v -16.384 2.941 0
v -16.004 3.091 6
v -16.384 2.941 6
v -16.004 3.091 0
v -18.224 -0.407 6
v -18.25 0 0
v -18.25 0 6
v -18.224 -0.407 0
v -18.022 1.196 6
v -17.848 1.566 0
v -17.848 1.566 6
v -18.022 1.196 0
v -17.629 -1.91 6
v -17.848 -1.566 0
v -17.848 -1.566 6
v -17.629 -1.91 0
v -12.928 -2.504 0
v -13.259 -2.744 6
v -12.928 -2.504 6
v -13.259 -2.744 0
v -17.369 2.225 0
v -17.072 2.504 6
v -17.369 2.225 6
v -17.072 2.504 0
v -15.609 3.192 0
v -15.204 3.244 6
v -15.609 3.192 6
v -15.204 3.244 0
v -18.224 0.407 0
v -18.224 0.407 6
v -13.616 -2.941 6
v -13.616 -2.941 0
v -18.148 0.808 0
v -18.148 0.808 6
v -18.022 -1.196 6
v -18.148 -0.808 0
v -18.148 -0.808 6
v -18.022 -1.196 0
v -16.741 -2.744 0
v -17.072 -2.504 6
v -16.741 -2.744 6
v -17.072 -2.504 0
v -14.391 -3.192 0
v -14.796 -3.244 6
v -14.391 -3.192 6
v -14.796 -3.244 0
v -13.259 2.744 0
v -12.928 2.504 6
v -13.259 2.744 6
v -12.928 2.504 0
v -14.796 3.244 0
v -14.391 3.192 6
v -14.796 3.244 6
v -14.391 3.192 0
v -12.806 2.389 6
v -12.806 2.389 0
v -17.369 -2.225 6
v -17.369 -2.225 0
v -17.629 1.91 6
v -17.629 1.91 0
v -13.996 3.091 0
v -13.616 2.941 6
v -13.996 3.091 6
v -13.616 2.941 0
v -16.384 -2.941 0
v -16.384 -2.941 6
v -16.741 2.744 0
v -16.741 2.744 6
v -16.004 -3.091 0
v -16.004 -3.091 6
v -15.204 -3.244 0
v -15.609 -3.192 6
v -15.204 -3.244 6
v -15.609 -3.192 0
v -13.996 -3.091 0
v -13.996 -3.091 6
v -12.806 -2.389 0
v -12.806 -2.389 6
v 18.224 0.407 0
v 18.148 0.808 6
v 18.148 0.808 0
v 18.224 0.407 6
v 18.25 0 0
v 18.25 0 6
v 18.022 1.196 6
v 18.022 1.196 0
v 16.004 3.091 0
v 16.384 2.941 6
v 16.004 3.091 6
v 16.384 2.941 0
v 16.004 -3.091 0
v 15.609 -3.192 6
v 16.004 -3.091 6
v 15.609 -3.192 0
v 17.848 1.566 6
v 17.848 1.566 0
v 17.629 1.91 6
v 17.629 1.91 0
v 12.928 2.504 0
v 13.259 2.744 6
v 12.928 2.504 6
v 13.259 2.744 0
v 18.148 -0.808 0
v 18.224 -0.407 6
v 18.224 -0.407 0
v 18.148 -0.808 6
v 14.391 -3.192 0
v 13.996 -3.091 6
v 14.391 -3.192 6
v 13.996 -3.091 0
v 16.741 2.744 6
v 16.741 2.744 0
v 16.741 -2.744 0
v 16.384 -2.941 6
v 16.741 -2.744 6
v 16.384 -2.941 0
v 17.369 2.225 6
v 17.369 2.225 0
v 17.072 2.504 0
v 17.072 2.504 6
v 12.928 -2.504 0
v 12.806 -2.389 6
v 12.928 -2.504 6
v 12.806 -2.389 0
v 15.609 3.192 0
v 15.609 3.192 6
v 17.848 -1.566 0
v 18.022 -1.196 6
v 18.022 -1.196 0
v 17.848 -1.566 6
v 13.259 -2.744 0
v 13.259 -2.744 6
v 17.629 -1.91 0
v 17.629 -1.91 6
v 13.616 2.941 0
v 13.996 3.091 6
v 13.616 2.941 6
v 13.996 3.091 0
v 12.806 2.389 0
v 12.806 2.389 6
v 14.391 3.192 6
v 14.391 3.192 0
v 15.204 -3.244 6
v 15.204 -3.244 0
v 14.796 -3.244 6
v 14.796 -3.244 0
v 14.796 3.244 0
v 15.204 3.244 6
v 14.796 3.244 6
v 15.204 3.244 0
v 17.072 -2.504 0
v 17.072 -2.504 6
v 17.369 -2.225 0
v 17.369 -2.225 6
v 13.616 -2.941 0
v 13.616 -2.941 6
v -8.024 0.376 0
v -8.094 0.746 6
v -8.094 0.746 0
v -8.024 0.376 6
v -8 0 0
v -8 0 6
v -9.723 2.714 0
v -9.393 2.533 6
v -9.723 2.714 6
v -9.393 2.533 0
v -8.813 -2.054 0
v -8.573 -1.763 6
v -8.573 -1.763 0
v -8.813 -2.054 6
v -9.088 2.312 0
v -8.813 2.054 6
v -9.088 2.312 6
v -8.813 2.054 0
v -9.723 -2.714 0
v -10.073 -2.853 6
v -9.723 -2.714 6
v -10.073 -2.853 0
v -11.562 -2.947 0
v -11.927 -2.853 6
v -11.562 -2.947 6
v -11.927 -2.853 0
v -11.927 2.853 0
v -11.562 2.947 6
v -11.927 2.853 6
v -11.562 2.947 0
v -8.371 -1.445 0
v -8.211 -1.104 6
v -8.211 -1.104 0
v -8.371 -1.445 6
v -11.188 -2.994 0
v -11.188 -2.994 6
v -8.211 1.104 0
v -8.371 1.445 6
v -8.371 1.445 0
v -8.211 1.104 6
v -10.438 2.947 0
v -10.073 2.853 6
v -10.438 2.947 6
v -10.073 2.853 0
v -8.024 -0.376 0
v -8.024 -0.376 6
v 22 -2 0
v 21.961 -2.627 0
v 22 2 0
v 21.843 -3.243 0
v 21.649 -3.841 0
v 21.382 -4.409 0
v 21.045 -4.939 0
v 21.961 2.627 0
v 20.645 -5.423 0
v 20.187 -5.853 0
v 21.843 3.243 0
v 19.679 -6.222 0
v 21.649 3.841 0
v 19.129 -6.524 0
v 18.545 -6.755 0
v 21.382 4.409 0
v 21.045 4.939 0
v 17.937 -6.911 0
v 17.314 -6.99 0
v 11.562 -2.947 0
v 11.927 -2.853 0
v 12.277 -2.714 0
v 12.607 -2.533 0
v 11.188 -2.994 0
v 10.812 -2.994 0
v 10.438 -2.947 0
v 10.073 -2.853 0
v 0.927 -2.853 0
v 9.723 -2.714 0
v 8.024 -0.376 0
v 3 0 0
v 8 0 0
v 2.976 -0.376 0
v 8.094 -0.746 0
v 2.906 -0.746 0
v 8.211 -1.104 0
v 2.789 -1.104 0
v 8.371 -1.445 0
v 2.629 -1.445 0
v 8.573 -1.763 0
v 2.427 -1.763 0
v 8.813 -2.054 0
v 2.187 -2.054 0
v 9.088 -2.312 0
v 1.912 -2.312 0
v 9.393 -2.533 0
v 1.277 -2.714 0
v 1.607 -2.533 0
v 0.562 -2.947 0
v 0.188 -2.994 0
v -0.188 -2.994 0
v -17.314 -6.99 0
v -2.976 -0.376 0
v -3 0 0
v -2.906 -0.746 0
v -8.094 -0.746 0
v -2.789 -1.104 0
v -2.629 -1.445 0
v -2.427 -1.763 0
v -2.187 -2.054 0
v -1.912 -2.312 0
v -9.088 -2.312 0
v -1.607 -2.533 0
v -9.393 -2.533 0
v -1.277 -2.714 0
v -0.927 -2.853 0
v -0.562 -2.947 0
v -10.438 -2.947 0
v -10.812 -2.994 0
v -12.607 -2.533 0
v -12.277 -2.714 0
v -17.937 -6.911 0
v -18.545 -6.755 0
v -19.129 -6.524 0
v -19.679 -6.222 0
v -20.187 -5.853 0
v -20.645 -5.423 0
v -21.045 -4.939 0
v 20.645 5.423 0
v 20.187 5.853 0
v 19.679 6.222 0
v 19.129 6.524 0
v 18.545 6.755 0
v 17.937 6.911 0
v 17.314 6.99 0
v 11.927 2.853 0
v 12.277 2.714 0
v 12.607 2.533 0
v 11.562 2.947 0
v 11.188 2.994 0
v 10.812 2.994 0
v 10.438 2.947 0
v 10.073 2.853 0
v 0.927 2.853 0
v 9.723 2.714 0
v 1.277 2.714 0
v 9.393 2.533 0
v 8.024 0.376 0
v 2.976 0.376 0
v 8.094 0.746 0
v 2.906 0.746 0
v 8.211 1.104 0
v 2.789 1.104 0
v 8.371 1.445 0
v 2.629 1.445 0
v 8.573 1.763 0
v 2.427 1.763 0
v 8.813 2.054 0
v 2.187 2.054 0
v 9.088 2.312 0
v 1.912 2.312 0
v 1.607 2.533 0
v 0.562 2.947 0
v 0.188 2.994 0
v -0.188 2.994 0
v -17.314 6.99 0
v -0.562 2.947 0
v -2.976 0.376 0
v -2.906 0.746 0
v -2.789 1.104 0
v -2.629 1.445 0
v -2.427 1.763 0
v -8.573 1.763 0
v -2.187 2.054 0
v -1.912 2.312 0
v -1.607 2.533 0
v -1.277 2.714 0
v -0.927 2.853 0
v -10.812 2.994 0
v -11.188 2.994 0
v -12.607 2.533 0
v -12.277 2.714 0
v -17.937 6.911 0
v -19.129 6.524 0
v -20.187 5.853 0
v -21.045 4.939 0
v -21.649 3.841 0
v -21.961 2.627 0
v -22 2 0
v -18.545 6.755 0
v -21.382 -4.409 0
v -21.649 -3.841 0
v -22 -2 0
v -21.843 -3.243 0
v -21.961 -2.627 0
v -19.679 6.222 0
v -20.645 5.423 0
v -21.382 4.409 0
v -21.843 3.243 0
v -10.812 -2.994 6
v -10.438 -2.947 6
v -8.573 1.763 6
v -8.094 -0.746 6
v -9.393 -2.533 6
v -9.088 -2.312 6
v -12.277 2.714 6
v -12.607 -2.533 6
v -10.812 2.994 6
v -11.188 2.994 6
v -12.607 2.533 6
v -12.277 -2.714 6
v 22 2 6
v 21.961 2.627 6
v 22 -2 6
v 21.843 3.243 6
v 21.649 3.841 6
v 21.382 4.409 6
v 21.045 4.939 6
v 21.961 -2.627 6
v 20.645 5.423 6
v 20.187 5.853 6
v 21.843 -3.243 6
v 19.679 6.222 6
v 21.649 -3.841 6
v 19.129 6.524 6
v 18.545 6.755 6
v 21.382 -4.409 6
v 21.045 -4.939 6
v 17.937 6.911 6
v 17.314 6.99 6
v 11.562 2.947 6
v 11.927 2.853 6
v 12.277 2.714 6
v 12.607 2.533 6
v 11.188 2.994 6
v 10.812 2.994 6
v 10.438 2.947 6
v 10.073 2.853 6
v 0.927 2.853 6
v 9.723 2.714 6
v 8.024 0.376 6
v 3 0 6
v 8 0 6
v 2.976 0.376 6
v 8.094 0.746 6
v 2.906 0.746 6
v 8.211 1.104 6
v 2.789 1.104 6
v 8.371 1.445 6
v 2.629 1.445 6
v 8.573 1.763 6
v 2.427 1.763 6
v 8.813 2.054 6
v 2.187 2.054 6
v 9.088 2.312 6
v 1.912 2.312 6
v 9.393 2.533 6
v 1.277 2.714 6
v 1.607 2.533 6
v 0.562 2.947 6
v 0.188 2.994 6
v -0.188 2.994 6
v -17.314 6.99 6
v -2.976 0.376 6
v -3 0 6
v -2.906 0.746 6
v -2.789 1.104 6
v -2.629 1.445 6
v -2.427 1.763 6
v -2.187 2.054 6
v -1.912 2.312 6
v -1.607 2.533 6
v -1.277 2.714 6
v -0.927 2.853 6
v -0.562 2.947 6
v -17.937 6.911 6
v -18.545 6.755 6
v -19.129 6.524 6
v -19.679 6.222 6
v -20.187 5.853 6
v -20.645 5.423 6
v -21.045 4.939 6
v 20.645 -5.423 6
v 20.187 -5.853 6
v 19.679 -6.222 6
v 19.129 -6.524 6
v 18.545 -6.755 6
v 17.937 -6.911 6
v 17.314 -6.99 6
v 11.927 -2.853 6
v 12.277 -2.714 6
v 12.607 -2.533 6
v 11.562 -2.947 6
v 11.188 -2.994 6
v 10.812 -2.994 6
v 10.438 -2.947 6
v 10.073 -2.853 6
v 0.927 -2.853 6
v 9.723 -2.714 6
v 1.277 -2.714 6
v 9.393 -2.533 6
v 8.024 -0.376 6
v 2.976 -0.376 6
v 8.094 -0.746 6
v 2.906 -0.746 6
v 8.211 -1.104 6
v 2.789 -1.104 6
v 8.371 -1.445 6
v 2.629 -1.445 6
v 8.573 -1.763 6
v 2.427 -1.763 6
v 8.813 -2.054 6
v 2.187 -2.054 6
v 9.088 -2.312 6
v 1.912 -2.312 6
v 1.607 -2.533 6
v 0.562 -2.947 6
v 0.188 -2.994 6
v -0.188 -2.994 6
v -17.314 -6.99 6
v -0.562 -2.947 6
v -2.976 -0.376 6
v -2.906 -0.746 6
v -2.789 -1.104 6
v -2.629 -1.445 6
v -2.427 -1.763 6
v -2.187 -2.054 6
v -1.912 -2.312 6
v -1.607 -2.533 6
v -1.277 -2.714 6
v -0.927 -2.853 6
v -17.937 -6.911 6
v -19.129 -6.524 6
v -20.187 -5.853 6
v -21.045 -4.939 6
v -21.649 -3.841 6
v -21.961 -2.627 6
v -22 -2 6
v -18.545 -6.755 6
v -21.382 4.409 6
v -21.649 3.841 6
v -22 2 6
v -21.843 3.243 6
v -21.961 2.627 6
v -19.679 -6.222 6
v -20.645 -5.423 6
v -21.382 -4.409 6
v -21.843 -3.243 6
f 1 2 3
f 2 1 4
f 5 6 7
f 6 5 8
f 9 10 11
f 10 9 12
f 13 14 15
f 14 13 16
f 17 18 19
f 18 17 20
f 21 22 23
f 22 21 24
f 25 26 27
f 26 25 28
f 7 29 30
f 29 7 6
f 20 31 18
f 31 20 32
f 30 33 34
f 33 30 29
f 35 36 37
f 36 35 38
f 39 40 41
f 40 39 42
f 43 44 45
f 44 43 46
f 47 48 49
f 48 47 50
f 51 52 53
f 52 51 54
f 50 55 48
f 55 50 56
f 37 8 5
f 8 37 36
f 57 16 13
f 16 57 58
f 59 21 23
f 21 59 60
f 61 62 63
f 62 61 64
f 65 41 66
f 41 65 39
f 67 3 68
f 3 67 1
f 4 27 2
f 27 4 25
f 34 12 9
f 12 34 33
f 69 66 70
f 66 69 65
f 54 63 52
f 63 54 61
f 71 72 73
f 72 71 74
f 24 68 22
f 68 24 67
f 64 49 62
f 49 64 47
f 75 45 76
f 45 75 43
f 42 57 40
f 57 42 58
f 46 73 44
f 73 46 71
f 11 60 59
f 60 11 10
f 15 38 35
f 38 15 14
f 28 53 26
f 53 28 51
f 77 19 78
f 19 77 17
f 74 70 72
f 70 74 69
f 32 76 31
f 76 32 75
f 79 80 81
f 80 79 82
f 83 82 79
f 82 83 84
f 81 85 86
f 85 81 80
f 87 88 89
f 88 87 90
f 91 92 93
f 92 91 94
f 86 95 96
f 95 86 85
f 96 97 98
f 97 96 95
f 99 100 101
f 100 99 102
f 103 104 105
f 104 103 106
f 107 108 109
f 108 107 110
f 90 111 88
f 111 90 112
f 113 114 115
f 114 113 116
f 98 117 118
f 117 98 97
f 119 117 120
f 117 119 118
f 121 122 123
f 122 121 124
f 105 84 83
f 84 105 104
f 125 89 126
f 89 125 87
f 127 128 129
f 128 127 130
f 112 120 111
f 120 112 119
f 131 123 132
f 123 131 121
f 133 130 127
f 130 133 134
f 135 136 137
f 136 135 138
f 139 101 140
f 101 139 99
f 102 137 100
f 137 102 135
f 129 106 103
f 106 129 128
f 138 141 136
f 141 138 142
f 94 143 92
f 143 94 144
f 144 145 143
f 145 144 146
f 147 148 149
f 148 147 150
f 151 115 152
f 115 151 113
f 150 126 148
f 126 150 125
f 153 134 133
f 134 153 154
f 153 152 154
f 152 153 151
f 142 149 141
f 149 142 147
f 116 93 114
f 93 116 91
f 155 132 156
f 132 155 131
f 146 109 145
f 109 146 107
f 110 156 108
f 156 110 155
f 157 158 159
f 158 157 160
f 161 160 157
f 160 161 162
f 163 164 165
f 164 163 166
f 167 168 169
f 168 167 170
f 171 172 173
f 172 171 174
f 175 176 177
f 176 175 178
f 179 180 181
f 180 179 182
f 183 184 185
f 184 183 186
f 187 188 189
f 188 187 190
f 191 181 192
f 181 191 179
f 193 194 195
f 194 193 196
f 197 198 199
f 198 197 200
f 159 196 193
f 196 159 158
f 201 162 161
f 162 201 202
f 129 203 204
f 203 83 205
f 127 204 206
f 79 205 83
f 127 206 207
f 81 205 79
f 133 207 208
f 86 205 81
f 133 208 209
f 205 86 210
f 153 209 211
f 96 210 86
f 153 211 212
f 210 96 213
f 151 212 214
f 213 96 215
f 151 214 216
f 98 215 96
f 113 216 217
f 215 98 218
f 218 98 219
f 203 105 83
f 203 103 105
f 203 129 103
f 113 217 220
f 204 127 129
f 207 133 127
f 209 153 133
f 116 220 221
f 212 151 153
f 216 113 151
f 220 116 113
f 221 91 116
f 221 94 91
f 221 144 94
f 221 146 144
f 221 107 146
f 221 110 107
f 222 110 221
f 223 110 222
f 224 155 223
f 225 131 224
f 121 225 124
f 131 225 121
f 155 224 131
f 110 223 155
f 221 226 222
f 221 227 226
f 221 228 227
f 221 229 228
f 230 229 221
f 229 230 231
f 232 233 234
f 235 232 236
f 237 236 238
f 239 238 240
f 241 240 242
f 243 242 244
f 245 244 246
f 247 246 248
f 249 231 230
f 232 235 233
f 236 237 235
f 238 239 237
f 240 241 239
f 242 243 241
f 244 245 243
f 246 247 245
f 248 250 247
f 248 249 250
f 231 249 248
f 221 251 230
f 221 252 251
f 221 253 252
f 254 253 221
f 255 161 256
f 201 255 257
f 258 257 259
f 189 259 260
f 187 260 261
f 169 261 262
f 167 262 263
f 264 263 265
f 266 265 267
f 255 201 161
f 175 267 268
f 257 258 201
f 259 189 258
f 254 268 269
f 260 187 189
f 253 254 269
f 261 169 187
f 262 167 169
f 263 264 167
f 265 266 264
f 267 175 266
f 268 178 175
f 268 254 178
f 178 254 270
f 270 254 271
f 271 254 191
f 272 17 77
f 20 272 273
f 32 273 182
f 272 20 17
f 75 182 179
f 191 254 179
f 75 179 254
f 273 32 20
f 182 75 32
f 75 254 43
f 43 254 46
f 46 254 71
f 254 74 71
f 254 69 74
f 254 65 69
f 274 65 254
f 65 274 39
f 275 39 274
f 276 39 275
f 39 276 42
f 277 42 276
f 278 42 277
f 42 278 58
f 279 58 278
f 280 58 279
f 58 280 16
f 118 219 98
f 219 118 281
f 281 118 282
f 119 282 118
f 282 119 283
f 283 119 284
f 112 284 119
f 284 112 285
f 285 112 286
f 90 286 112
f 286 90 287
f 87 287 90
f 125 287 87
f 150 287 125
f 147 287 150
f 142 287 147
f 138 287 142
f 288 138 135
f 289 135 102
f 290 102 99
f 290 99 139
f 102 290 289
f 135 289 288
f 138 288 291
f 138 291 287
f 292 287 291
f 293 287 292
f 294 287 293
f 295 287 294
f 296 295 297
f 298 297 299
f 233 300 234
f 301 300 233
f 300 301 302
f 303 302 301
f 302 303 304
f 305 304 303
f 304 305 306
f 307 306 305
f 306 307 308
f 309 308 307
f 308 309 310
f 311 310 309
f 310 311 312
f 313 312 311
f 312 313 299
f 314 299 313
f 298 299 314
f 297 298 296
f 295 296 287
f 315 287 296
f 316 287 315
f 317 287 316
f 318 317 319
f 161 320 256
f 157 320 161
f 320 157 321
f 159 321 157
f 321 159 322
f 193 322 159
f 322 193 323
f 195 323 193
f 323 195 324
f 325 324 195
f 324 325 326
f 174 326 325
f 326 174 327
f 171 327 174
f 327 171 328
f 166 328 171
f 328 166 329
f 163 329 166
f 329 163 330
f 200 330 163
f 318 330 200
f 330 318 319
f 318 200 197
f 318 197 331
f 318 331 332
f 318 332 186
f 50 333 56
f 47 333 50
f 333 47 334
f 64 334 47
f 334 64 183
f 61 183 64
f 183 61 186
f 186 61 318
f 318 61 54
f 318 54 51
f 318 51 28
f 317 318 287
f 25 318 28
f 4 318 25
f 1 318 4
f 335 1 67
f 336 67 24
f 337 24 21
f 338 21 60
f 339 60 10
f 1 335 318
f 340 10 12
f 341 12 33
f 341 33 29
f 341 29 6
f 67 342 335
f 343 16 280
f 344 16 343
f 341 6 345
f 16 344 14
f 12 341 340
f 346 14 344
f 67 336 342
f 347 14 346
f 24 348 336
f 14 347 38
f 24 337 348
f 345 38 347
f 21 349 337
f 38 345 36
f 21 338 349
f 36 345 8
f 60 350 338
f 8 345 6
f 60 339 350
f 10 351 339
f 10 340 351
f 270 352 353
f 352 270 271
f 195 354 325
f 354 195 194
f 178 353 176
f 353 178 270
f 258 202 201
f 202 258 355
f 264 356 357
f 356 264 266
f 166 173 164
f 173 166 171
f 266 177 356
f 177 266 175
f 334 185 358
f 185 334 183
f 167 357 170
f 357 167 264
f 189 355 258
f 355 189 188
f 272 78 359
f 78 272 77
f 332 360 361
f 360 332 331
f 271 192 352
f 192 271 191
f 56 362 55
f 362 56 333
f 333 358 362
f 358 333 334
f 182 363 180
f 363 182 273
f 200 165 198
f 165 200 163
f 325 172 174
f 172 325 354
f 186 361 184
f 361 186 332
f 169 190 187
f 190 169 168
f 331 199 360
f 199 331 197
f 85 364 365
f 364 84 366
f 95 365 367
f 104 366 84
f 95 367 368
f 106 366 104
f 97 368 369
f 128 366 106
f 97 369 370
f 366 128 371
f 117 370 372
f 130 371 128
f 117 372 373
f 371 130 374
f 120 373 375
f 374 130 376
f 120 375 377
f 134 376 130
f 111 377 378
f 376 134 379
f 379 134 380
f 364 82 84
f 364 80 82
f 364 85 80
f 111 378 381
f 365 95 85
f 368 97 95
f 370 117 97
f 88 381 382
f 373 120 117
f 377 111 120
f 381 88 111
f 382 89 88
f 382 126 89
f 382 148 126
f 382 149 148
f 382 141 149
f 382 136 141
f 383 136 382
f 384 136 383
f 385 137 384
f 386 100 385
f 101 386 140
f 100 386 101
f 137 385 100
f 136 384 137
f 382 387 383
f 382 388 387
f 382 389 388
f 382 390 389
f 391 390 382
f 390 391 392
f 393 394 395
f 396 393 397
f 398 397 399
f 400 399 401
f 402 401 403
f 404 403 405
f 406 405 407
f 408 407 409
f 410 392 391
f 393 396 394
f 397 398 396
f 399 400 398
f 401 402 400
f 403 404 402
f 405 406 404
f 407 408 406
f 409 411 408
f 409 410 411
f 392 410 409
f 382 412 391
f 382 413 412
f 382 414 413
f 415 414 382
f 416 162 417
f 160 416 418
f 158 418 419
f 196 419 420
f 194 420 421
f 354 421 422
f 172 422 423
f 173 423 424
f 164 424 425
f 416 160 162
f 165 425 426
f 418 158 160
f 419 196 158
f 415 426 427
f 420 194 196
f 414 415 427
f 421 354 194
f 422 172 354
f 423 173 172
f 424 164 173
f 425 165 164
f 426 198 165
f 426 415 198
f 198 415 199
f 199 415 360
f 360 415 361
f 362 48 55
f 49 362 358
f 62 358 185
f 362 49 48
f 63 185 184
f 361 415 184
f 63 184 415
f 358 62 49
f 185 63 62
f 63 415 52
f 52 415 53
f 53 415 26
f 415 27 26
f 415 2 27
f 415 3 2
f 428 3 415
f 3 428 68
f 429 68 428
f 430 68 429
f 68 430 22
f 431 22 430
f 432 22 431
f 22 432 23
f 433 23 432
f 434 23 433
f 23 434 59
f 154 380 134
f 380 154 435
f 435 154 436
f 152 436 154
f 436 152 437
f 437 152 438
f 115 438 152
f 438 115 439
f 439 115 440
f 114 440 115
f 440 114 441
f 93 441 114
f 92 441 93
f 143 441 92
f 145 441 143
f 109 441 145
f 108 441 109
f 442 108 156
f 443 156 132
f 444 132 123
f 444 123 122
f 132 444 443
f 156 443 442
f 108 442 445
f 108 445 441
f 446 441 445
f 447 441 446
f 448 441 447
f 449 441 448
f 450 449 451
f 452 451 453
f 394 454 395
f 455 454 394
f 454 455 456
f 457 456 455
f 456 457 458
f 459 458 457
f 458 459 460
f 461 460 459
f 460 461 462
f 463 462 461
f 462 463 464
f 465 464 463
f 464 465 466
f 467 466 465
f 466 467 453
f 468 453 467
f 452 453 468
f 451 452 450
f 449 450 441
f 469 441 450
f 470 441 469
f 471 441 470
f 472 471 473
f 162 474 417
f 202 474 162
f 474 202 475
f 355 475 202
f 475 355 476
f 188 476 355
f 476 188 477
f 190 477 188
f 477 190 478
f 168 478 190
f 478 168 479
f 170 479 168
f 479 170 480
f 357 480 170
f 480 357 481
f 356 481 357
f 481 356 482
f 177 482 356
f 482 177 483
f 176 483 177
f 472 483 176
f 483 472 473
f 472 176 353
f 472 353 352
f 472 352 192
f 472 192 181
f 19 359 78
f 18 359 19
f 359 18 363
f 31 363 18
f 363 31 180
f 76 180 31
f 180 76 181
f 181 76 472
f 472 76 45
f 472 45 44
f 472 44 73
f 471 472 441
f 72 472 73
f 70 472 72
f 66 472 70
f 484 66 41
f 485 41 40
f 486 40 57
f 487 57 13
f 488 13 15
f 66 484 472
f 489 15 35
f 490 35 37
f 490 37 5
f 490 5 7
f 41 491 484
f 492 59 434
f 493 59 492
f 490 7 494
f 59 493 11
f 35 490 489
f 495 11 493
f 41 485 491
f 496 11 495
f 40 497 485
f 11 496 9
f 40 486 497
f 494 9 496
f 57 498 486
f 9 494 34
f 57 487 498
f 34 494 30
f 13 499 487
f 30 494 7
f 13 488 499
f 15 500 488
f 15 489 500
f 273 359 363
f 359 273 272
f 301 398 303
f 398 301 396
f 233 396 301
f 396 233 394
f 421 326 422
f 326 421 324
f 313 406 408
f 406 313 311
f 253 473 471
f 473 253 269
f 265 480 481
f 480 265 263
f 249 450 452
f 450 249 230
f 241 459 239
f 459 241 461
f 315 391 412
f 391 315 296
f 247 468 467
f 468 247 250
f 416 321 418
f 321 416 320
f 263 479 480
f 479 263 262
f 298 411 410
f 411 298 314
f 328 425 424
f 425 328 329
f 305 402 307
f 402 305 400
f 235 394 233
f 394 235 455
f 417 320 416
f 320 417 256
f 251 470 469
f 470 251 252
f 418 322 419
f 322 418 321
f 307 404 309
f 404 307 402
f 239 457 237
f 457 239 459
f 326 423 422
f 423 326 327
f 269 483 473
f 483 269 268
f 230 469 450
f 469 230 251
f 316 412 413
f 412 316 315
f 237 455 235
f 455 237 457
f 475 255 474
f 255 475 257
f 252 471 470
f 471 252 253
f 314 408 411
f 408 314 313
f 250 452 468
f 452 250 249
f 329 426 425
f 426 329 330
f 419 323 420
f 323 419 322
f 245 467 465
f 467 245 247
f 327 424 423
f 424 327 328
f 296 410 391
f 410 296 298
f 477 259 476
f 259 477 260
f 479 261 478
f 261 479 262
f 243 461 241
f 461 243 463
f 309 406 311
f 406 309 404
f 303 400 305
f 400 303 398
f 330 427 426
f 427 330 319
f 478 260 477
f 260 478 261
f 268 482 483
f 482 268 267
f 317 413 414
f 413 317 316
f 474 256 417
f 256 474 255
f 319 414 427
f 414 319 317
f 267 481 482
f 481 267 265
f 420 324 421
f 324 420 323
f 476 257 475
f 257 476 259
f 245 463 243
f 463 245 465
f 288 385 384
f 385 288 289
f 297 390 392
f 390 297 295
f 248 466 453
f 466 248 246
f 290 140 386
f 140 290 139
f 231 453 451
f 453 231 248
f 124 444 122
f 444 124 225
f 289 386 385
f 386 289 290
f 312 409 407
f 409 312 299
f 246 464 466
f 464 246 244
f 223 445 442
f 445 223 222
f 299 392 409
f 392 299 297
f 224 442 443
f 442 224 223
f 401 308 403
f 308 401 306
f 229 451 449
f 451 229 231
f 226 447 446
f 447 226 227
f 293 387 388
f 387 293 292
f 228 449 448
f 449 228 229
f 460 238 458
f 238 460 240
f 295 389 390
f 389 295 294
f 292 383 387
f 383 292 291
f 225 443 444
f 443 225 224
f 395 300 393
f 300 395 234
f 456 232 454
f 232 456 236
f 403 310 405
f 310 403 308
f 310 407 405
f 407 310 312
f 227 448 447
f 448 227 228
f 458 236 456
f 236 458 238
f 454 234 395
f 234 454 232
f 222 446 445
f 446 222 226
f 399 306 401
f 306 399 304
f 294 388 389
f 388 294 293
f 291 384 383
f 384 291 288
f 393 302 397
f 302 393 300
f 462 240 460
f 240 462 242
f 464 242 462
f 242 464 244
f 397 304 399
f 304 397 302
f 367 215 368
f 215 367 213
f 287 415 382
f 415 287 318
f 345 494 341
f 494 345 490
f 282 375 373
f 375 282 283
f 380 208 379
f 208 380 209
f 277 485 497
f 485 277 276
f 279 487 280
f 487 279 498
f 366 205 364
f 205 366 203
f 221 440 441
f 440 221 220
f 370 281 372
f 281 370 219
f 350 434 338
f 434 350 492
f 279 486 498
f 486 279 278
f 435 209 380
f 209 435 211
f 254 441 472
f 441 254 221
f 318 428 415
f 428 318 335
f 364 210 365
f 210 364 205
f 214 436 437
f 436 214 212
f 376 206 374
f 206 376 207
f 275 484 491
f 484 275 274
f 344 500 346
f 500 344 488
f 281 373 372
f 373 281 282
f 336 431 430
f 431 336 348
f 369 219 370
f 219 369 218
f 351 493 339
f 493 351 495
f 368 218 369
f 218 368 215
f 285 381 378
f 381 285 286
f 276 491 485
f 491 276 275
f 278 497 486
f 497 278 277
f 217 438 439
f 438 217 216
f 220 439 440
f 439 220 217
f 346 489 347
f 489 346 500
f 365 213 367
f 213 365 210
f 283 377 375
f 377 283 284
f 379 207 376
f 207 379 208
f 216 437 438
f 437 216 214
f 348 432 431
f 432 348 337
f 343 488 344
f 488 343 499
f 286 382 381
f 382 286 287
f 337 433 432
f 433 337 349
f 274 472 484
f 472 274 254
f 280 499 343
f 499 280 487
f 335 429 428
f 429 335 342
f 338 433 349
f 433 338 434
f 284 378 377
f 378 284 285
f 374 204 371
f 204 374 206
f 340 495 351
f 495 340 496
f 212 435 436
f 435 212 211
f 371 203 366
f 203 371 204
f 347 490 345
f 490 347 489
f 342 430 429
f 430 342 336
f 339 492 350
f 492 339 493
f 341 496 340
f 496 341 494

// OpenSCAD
$fn = 50;


difference() {
	union() {
		hull() {
			translate(v = [-17.0000000000, 2.0000000000, 0]) {
				cylinder(h = 6, r = 5);
			}
			translate(v = [17.0000000000, 2.0000000000, 0]) {
				cylinder(h = 6, r = 5);
			}
			translate(v = [-17.0000000000, -2.0000000000, 0]) {
				cylinder(h = 6, r = 5);
			}
			translate(v = [17.0000000000, -2.0000000000, 0]) {
				cylinder(h = 6, r = 5);
			}
		}
	}
	union() {
		#translate(v = [-15.0000000000, 0.0000000000, -100.0000000000]) {
			cylinder(h = 200, r = 3.2500000000);
		}
		#translate(v = [-15.0000000000, 0.0000000000, -100.0000000000]) {
			cylinder(h = 200, r = 3.2500000000);
		}
		#translate(v = [15.0000000000, 0.0000000000, -100.0000000000]) {
			cylinder(h = 200, r = 3.2500000000);
		}
		#translate(v = [15.0000000000, 0.0000000000, -100.0000000000]) {
			cylinder(h = 200, r = 3.2500000000);
		}
		#translate(v = [-11.0000000000, 0, 0]) {
			cylinder(h = 6, r = 3.0000000000);
		}
		#cylinder(h = 6, r = 3.0000000000);
		#translate(v = [11.0000000000, 0, 0]) {
			cylinder(h = 6, r = 3.0000000000);
		}
	}
}
